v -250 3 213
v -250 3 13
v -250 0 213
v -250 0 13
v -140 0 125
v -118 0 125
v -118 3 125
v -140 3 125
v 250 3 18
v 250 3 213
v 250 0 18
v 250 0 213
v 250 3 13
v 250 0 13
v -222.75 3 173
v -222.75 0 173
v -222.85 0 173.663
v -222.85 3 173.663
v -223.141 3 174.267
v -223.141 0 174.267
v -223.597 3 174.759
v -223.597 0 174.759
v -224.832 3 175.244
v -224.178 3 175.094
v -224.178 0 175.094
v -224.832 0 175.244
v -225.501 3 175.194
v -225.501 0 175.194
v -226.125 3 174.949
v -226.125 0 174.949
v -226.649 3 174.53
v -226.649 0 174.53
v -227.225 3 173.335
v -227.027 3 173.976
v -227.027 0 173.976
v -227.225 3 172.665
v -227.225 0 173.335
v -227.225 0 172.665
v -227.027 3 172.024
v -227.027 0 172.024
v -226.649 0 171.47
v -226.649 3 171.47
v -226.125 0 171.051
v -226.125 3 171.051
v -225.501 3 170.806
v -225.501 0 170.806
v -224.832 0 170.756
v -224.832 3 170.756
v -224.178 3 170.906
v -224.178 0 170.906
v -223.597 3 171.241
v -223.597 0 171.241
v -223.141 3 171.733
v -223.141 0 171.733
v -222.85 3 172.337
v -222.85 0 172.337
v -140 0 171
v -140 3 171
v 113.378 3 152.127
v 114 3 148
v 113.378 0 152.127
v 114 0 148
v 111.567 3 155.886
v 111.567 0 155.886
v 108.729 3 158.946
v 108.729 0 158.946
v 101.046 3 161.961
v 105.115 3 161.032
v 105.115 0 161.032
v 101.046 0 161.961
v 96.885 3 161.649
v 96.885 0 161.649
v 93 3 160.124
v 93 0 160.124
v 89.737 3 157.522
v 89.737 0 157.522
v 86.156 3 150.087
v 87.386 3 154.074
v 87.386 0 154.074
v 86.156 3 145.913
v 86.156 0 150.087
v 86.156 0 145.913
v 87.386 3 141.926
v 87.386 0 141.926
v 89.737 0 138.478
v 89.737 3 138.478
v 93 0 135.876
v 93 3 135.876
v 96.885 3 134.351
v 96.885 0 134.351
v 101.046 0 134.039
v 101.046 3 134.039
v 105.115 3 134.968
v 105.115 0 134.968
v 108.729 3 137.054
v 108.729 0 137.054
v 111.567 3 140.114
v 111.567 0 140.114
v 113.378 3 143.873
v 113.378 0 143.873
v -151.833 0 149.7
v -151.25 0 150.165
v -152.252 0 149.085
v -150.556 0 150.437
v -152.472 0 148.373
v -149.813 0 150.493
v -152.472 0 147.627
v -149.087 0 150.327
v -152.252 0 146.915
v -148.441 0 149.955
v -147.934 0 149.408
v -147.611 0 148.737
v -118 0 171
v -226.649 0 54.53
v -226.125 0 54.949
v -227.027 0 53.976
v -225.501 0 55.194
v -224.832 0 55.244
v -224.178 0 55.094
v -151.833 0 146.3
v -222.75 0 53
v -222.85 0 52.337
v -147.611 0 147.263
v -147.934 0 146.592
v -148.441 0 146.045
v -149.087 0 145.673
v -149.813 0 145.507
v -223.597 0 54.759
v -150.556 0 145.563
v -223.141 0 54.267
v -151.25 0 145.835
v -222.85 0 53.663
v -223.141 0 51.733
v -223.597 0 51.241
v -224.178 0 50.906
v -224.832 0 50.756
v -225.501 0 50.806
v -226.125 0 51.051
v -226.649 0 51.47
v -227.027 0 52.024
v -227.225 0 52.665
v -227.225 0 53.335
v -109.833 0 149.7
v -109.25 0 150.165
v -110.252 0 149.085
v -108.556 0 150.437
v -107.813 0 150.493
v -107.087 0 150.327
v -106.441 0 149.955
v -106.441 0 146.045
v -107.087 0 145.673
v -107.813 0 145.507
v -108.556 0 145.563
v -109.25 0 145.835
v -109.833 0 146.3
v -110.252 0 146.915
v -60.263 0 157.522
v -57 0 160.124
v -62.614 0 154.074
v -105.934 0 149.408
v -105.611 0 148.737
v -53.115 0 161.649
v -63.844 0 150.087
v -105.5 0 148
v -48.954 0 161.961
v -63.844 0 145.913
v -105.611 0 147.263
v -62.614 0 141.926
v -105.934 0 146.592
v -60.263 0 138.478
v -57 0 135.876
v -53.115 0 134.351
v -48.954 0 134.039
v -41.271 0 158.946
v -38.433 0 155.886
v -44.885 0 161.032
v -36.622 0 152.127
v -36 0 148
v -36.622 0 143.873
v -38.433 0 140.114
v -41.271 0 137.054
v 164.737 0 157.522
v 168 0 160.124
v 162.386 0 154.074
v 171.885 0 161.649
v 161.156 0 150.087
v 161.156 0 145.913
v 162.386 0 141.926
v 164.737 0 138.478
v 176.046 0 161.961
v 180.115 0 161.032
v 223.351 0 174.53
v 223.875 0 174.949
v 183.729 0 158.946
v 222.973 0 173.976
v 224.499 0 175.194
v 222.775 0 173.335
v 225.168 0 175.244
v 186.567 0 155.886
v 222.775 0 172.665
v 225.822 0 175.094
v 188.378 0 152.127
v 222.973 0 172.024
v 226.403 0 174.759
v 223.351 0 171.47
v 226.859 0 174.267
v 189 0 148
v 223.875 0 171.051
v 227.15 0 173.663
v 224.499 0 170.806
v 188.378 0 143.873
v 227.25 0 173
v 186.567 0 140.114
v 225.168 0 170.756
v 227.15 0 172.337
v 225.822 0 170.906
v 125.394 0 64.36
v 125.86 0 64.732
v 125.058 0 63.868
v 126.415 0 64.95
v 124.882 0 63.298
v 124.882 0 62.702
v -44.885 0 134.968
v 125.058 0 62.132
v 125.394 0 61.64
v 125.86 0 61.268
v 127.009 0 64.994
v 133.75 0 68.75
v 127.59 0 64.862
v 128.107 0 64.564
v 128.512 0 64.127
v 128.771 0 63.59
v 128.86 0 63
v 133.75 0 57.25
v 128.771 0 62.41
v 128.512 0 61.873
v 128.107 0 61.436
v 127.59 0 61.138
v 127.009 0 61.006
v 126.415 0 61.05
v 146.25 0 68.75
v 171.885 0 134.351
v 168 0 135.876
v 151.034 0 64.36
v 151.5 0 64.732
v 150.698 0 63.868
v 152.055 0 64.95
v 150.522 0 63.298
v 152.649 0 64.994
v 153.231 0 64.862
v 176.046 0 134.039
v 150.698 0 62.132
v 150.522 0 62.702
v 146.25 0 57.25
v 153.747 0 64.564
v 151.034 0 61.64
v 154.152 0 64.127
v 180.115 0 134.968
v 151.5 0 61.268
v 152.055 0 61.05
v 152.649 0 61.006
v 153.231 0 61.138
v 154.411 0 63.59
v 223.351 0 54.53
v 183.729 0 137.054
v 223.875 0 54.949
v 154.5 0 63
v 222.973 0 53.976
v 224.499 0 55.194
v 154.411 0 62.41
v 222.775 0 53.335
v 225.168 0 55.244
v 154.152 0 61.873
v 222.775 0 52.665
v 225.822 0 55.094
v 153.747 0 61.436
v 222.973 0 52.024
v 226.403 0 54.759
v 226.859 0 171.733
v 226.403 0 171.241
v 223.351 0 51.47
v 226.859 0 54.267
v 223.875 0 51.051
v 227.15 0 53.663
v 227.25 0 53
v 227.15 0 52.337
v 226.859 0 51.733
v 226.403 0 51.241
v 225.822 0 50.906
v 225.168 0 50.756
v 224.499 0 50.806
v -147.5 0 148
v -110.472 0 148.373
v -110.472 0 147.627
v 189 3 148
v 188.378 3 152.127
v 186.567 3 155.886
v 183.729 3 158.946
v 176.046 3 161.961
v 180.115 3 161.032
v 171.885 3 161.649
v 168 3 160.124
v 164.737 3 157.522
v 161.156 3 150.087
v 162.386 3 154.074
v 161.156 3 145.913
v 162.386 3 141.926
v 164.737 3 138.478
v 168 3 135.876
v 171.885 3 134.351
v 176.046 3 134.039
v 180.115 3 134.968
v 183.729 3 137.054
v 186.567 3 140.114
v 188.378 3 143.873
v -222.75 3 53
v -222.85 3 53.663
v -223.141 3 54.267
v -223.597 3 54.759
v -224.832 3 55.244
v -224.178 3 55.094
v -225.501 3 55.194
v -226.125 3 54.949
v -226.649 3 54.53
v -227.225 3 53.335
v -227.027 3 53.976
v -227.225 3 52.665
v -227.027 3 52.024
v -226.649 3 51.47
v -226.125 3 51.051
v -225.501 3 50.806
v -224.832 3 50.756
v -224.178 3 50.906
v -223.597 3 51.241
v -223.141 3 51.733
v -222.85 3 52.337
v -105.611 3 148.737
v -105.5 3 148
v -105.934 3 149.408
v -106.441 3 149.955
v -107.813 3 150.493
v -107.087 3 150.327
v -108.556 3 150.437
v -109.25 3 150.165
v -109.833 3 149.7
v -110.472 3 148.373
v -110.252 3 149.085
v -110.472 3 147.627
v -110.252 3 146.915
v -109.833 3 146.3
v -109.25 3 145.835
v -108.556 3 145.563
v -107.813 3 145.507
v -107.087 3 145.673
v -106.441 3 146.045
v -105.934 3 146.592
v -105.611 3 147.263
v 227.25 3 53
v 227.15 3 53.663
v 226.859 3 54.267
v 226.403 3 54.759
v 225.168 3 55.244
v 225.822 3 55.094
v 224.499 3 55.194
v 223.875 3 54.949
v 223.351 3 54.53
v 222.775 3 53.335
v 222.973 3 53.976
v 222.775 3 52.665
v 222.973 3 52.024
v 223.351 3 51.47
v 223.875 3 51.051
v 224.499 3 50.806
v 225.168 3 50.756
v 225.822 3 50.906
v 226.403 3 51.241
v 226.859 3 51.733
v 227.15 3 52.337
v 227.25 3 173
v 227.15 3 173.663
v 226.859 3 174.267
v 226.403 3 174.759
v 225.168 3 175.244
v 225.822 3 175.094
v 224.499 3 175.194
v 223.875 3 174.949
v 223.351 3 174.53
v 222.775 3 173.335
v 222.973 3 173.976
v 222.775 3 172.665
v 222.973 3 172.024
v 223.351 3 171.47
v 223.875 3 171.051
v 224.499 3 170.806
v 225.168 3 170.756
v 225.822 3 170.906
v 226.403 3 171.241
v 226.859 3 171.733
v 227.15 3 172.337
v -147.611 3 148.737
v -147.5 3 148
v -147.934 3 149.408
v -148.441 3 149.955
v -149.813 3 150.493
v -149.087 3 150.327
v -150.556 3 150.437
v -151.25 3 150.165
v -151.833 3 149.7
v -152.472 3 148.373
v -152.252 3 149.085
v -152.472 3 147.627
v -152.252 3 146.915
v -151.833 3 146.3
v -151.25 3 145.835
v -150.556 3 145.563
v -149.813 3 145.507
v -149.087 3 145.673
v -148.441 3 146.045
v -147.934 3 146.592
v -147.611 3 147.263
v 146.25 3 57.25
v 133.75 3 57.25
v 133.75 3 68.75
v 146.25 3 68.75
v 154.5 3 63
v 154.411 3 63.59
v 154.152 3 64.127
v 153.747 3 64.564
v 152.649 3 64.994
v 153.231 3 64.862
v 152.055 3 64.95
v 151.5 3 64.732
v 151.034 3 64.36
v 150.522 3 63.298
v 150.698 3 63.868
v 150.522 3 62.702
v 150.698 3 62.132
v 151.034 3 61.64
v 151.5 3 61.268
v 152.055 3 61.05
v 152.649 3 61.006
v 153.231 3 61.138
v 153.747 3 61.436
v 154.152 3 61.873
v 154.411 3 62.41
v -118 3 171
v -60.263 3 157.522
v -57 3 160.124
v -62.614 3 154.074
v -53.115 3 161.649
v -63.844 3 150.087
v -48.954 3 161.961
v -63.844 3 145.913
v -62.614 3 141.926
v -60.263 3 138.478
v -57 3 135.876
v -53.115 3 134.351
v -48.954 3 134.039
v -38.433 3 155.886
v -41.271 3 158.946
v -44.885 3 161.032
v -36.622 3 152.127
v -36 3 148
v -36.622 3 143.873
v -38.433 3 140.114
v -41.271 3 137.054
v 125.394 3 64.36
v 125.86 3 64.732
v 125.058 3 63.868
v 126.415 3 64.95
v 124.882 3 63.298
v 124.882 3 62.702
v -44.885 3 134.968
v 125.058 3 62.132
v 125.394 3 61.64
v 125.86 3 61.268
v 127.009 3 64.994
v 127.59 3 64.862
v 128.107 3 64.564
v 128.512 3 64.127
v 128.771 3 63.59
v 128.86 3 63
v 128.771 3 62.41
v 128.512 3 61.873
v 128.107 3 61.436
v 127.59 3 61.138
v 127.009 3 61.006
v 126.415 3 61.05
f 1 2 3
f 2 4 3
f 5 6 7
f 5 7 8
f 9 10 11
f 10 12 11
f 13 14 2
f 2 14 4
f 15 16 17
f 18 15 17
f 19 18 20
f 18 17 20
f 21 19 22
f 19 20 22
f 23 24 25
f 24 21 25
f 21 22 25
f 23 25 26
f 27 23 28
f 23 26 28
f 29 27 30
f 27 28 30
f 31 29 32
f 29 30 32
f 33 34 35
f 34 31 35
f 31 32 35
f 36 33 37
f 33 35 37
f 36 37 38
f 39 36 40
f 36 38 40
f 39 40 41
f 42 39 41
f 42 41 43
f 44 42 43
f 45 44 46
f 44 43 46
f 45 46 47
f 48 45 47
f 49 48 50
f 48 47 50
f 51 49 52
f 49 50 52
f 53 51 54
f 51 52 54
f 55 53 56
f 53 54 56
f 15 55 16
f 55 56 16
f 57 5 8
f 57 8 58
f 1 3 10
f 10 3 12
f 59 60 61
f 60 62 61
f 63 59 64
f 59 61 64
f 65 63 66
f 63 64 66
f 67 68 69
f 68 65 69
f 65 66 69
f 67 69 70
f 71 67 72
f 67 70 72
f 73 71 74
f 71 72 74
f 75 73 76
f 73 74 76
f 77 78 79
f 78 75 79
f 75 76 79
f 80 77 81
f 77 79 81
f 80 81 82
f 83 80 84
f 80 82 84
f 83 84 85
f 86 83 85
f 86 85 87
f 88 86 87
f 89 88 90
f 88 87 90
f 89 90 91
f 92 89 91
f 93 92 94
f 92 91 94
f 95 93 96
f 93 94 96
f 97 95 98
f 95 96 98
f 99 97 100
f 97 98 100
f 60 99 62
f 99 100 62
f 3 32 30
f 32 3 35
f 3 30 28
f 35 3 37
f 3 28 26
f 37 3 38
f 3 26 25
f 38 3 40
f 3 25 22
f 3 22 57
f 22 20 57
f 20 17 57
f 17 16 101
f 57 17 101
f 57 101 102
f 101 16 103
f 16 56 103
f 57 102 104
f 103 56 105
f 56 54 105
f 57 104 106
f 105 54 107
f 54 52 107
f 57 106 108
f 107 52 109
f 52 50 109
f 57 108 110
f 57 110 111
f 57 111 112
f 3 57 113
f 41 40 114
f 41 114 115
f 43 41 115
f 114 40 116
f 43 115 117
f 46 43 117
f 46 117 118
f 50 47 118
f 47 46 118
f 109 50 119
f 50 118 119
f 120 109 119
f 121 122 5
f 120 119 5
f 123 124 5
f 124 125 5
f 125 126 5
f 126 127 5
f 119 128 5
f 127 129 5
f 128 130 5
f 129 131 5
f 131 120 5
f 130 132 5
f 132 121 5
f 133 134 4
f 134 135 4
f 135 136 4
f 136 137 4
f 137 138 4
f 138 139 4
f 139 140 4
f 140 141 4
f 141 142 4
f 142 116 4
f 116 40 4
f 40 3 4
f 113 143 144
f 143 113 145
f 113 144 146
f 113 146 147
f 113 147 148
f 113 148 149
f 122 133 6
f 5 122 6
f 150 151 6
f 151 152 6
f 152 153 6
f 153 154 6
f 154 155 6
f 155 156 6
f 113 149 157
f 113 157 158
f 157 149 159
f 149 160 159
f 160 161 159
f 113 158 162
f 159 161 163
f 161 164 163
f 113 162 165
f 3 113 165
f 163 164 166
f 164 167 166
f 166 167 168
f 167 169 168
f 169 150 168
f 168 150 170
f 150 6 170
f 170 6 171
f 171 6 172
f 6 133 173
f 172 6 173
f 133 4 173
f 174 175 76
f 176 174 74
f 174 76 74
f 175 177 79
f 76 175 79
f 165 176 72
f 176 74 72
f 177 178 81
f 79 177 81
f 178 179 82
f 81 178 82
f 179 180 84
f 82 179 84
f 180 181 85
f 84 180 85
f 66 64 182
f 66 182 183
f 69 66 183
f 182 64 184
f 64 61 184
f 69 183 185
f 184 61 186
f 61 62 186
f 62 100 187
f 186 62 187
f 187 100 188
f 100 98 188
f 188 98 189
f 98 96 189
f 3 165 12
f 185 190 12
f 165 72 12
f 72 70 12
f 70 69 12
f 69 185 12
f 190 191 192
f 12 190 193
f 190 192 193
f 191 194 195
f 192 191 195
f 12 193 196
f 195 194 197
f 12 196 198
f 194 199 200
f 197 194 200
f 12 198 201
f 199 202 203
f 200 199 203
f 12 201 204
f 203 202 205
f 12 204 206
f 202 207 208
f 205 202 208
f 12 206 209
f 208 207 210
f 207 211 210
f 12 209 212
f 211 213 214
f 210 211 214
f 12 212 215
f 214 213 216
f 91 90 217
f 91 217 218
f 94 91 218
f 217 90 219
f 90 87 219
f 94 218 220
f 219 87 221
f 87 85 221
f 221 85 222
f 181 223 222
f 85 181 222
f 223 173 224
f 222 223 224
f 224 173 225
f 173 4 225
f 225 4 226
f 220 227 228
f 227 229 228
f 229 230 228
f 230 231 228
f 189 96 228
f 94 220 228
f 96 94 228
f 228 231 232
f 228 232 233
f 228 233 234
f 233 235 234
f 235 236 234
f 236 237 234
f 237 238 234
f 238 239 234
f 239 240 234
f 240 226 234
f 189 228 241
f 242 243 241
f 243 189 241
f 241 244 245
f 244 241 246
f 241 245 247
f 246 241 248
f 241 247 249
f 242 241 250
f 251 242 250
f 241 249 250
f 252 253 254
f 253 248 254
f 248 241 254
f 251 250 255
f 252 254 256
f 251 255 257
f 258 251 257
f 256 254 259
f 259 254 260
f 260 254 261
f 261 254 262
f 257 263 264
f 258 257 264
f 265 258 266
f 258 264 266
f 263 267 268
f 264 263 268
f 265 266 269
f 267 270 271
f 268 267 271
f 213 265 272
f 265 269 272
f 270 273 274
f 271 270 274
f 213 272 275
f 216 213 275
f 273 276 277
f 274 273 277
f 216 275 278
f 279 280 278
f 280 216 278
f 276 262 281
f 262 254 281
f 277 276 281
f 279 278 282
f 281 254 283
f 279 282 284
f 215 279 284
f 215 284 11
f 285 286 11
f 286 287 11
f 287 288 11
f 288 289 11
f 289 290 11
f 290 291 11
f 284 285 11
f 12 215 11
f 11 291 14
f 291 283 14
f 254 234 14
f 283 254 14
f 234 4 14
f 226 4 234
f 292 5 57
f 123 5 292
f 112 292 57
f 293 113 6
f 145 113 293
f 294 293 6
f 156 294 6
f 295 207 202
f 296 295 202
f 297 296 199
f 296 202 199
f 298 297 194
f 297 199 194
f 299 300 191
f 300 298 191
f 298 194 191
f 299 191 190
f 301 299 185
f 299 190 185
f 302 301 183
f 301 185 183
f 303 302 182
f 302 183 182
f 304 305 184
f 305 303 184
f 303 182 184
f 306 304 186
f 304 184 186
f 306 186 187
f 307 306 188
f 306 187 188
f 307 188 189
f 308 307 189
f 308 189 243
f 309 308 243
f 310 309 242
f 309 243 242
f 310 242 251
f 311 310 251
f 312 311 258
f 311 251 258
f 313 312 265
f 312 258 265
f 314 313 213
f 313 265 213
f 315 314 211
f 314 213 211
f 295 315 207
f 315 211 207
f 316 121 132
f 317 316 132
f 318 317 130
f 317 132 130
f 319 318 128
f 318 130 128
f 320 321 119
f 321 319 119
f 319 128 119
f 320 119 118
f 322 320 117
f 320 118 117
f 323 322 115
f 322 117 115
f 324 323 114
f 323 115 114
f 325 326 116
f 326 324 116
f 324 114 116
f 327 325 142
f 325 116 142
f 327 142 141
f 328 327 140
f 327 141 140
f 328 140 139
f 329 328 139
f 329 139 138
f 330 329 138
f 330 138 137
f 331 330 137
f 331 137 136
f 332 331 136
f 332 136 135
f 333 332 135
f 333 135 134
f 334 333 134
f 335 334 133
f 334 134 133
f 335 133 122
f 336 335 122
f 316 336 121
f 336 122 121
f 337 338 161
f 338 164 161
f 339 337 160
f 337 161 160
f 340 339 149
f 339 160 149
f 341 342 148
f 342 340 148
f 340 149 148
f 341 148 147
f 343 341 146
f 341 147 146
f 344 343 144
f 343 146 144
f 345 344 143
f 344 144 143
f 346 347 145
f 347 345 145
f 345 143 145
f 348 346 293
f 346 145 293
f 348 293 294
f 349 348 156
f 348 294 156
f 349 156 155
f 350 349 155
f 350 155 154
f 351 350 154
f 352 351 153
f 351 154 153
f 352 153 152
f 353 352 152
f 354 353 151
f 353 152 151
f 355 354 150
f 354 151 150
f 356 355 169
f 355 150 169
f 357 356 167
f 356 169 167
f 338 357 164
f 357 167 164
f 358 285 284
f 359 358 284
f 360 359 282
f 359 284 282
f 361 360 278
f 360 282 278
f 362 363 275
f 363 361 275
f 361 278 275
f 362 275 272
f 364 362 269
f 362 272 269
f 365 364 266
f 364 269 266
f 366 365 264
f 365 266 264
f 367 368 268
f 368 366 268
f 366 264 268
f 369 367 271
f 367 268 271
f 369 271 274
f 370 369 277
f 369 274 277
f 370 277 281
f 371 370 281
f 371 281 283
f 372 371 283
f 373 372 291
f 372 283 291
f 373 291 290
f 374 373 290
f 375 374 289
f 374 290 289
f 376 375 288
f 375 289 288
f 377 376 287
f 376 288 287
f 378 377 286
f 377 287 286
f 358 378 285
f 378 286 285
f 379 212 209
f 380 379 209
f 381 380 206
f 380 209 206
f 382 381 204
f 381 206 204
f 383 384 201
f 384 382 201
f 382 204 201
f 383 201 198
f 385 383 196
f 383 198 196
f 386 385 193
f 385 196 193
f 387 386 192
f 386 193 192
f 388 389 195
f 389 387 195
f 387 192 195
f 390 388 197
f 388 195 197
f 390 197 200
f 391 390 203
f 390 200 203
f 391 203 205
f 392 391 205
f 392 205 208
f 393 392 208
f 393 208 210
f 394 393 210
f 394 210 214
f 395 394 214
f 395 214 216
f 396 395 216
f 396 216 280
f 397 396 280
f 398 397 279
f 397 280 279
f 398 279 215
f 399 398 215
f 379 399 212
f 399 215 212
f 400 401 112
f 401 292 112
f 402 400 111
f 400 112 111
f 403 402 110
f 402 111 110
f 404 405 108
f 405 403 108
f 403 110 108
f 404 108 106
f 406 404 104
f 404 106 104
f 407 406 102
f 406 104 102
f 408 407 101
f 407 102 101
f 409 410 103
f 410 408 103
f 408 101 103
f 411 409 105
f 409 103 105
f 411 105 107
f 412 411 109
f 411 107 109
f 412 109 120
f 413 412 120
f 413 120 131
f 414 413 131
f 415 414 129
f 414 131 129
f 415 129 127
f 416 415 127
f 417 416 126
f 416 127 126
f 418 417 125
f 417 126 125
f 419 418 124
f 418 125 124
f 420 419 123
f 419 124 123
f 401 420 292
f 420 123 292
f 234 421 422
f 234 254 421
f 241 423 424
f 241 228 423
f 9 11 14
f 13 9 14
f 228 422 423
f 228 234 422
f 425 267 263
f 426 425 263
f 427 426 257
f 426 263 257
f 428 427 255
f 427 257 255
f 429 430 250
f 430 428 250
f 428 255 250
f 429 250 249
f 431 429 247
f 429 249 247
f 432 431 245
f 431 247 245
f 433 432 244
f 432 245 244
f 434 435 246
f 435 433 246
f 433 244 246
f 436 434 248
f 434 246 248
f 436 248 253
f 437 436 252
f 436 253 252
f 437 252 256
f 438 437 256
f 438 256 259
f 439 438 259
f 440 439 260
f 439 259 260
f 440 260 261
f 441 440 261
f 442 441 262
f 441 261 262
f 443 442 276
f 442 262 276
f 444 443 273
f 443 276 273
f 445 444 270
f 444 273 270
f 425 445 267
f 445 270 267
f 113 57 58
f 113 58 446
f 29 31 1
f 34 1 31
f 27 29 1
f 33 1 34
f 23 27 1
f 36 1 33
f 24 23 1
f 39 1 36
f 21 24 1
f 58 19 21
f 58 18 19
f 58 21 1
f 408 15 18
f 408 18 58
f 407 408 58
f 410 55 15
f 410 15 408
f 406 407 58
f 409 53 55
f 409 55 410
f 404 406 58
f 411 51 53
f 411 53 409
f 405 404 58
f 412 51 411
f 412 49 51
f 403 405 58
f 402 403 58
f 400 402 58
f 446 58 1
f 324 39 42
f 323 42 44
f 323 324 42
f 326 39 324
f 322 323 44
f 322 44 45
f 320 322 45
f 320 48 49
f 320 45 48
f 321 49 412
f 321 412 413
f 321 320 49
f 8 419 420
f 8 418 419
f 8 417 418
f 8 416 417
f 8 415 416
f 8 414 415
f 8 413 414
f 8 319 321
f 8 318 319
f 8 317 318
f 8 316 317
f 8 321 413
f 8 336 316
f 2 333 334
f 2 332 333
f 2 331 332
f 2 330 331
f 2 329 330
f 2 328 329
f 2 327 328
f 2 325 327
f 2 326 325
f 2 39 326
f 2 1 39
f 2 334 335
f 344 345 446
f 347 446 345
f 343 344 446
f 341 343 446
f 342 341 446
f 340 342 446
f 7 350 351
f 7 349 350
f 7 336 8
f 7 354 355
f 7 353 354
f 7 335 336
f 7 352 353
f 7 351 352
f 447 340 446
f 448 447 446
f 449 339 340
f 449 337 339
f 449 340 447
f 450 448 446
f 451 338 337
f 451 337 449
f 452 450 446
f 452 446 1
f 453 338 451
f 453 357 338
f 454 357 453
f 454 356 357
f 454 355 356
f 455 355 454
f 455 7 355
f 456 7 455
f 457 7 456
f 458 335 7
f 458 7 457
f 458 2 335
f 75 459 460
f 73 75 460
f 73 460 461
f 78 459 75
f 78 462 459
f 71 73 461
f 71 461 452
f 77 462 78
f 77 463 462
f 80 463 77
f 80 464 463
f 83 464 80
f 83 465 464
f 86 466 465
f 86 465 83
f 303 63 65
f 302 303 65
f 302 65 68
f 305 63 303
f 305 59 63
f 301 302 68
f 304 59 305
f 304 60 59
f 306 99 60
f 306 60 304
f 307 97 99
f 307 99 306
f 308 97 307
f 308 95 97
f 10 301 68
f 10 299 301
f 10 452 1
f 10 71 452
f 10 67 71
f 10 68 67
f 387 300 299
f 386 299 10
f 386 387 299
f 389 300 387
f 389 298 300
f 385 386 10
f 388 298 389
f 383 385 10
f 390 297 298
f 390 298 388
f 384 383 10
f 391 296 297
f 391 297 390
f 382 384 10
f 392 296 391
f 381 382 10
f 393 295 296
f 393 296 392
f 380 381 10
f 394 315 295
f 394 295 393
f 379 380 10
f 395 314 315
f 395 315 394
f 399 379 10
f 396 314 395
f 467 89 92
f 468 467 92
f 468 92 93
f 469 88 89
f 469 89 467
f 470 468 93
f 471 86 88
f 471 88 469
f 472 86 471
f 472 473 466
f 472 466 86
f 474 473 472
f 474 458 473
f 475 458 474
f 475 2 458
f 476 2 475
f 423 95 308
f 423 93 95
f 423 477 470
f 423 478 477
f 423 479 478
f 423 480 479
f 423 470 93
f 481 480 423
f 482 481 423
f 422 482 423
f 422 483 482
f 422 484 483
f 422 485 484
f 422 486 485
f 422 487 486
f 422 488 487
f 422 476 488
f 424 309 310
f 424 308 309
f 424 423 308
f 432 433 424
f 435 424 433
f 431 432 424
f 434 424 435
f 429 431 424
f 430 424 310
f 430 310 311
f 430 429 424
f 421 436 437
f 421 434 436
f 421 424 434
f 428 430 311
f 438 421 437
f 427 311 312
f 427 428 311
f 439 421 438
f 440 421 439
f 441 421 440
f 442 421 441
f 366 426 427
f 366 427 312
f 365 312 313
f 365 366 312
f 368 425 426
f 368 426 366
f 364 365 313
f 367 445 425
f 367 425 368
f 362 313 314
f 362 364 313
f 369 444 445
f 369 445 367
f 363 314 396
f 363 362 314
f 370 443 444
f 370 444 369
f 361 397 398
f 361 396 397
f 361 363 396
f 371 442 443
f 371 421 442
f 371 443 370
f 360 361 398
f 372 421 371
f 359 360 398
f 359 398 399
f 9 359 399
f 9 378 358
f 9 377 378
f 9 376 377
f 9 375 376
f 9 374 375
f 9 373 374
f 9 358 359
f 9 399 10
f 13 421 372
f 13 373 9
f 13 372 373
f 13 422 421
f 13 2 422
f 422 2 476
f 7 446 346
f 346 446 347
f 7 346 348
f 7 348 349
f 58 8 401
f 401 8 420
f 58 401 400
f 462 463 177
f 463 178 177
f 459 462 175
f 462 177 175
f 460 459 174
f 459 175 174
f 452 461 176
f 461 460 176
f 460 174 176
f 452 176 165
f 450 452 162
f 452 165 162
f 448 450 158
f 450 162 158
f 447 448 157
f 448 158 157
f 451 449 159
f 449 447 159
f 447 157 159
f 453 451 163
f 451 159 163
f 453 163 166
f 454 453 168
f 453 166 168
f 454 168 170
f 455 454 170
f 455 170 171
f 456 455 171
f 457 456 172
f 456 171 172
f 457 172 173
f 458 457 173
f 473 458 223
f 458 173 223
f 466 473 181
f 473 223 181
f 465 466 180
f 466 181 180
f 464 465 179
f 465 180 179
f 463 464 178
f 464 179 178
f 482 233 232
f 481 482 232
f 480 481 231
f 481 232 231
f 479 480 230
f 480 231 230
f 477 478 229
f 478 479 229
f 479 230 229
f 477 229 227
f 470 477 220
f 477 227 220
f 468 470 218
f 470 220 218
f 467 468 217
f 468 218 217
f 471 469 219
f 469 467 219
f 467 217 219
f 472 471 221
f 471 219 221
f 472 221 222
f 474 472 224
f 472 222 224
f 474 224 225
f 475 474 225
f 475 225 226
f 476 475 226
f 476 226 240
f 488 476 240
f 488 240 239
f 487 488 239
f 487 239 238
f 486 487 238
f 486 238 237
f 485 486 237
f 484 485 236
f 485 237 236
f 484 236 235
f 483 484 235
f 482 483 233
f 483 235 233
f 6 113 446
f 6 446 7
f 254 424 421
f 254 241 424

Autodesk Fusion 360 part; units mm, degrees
sketch "Panel" plane through (0, 0, 0) normal (0, 1, 0) x (1, 0, 0)
  line L0 (250, -18) -> (250, -13)
  circle A0 centre (175, -148) radius 14
  line L1 (-140, -125) -> (-118, -171) construction
  circle A1 centre (-108, -148) radius 2.5
  circle A2 centre (152.5, -63) radius 2
  line L2 (140, -80) -> (140, -13) construction
  line L3 (-140, -125) -> (-140, -171)
  line L4 (123.1713, -63) -> (203.1713, -63) construction
  line L5 (-118, -125) -> (-140, -171) construction
  line L6 (250, -13) -> (-250, -13)
  line L7 (250, -213) -> (250, -13)
  circle A3 centre (100, -148) radius 14
  circle A4 centre (-150, -148) radius 2.5
  line L8 (-118, -171) -> (-118, -125)
  circle A5 centre (-50, -148) radius 14
  line L9 (-250, -213) -> (250, -213)
  line L10 (-250, -13) -> (-250, -213)
  line L11 (250, -13) -> (-250, -13)
  circle A6 centre (225, -53) radius 2.25
  line L12 (225, -213) -> (225, -13) construction
  line L13 (-140, -171) -> (-118, -171)
  line L14 (-118, -125) -> (-140, -125)
  line L15 (250, -148) -> (-250, -148) construction
  line L16 (-225, -213) -> (-225, -13) construction
  circle A7 centre (225, -173) radius 2.25
  circle A8 centre (-225, -53) radius 2.25
  circle A9 centre (-225, -173) radius 2.25
  circle A10 centre (126.8597, -63) radius 2
  line L17 (146.25, -57.25) -> (133.75, -57.25)
  line L18 (133.75, -57.25) -> (133.75, -68.75)
  line L19 (133.75, -68.75) -> (146.25, -68.75)
  line L20 (146.25, -68.75) -> (146.25, -57.25)
  line L21 (146.25, -57.25) -> (133.75, -68.75) construction
  line L22 (133.75, -57.25) -> (146.25, -68.75) construction
  point P0 (189, -148)
  point P1 (-152.5, -148)
  point P2 (-129, -148)
  point P3 (140, -63)
  dimension "d1" = 500
  dimension "d2" = 200
  dimension "d3" = 28
  dimension "d4" = 28
  dimension "d5" = 28
  dimension "d6" = 150
  dimension "d7" = 46
  dimension "d8" = 22
  dimension "d9" = 5
  dimension "d10" = 5
  dimension "d11" = 21
  dimension "d12" = 21
  dimension "d13" = 100
  dimension "d14" = 75
  dimension "d15" = 25
  dimension "d16" = 25
  dimension "d17" = 4.5
  dimension "d18" = 40
  dimension "d25" = 110
  dimension "d28" = 4
  dimension "d30" = 12.5
  dimension "d32" = 50
  dimension "d34" = 13
  dimension "d35" = 75
  dimension "d36" = 250
  dimension "d37" = 65
  dimension "d38" = 4.5
  dimension "d39" = 4.5
  dimension "d40" = 4.5
  dimension "d41" = 40
  dimension "d42" = 40
  dimension "d43" = 40
  dimension "d44" = 4
  dimension "d45" = 12.5
extrude "Extrude1" add sketch "Panel" along normal blind 3
equation "d4 = d3"
equation "d5 = d3"
equation "d6 = d140 * 2"
equation "d12 = d124"
equation "d18 = d41"
equation "d22 = d163"
equation "d36 = d1 / 2"
equation "d38 = d17"
equation "d39 = d17"
equation "d40 = d17"
equation "d42 = d41"
equation "d43 = d41"
equation "d44 = d28"
